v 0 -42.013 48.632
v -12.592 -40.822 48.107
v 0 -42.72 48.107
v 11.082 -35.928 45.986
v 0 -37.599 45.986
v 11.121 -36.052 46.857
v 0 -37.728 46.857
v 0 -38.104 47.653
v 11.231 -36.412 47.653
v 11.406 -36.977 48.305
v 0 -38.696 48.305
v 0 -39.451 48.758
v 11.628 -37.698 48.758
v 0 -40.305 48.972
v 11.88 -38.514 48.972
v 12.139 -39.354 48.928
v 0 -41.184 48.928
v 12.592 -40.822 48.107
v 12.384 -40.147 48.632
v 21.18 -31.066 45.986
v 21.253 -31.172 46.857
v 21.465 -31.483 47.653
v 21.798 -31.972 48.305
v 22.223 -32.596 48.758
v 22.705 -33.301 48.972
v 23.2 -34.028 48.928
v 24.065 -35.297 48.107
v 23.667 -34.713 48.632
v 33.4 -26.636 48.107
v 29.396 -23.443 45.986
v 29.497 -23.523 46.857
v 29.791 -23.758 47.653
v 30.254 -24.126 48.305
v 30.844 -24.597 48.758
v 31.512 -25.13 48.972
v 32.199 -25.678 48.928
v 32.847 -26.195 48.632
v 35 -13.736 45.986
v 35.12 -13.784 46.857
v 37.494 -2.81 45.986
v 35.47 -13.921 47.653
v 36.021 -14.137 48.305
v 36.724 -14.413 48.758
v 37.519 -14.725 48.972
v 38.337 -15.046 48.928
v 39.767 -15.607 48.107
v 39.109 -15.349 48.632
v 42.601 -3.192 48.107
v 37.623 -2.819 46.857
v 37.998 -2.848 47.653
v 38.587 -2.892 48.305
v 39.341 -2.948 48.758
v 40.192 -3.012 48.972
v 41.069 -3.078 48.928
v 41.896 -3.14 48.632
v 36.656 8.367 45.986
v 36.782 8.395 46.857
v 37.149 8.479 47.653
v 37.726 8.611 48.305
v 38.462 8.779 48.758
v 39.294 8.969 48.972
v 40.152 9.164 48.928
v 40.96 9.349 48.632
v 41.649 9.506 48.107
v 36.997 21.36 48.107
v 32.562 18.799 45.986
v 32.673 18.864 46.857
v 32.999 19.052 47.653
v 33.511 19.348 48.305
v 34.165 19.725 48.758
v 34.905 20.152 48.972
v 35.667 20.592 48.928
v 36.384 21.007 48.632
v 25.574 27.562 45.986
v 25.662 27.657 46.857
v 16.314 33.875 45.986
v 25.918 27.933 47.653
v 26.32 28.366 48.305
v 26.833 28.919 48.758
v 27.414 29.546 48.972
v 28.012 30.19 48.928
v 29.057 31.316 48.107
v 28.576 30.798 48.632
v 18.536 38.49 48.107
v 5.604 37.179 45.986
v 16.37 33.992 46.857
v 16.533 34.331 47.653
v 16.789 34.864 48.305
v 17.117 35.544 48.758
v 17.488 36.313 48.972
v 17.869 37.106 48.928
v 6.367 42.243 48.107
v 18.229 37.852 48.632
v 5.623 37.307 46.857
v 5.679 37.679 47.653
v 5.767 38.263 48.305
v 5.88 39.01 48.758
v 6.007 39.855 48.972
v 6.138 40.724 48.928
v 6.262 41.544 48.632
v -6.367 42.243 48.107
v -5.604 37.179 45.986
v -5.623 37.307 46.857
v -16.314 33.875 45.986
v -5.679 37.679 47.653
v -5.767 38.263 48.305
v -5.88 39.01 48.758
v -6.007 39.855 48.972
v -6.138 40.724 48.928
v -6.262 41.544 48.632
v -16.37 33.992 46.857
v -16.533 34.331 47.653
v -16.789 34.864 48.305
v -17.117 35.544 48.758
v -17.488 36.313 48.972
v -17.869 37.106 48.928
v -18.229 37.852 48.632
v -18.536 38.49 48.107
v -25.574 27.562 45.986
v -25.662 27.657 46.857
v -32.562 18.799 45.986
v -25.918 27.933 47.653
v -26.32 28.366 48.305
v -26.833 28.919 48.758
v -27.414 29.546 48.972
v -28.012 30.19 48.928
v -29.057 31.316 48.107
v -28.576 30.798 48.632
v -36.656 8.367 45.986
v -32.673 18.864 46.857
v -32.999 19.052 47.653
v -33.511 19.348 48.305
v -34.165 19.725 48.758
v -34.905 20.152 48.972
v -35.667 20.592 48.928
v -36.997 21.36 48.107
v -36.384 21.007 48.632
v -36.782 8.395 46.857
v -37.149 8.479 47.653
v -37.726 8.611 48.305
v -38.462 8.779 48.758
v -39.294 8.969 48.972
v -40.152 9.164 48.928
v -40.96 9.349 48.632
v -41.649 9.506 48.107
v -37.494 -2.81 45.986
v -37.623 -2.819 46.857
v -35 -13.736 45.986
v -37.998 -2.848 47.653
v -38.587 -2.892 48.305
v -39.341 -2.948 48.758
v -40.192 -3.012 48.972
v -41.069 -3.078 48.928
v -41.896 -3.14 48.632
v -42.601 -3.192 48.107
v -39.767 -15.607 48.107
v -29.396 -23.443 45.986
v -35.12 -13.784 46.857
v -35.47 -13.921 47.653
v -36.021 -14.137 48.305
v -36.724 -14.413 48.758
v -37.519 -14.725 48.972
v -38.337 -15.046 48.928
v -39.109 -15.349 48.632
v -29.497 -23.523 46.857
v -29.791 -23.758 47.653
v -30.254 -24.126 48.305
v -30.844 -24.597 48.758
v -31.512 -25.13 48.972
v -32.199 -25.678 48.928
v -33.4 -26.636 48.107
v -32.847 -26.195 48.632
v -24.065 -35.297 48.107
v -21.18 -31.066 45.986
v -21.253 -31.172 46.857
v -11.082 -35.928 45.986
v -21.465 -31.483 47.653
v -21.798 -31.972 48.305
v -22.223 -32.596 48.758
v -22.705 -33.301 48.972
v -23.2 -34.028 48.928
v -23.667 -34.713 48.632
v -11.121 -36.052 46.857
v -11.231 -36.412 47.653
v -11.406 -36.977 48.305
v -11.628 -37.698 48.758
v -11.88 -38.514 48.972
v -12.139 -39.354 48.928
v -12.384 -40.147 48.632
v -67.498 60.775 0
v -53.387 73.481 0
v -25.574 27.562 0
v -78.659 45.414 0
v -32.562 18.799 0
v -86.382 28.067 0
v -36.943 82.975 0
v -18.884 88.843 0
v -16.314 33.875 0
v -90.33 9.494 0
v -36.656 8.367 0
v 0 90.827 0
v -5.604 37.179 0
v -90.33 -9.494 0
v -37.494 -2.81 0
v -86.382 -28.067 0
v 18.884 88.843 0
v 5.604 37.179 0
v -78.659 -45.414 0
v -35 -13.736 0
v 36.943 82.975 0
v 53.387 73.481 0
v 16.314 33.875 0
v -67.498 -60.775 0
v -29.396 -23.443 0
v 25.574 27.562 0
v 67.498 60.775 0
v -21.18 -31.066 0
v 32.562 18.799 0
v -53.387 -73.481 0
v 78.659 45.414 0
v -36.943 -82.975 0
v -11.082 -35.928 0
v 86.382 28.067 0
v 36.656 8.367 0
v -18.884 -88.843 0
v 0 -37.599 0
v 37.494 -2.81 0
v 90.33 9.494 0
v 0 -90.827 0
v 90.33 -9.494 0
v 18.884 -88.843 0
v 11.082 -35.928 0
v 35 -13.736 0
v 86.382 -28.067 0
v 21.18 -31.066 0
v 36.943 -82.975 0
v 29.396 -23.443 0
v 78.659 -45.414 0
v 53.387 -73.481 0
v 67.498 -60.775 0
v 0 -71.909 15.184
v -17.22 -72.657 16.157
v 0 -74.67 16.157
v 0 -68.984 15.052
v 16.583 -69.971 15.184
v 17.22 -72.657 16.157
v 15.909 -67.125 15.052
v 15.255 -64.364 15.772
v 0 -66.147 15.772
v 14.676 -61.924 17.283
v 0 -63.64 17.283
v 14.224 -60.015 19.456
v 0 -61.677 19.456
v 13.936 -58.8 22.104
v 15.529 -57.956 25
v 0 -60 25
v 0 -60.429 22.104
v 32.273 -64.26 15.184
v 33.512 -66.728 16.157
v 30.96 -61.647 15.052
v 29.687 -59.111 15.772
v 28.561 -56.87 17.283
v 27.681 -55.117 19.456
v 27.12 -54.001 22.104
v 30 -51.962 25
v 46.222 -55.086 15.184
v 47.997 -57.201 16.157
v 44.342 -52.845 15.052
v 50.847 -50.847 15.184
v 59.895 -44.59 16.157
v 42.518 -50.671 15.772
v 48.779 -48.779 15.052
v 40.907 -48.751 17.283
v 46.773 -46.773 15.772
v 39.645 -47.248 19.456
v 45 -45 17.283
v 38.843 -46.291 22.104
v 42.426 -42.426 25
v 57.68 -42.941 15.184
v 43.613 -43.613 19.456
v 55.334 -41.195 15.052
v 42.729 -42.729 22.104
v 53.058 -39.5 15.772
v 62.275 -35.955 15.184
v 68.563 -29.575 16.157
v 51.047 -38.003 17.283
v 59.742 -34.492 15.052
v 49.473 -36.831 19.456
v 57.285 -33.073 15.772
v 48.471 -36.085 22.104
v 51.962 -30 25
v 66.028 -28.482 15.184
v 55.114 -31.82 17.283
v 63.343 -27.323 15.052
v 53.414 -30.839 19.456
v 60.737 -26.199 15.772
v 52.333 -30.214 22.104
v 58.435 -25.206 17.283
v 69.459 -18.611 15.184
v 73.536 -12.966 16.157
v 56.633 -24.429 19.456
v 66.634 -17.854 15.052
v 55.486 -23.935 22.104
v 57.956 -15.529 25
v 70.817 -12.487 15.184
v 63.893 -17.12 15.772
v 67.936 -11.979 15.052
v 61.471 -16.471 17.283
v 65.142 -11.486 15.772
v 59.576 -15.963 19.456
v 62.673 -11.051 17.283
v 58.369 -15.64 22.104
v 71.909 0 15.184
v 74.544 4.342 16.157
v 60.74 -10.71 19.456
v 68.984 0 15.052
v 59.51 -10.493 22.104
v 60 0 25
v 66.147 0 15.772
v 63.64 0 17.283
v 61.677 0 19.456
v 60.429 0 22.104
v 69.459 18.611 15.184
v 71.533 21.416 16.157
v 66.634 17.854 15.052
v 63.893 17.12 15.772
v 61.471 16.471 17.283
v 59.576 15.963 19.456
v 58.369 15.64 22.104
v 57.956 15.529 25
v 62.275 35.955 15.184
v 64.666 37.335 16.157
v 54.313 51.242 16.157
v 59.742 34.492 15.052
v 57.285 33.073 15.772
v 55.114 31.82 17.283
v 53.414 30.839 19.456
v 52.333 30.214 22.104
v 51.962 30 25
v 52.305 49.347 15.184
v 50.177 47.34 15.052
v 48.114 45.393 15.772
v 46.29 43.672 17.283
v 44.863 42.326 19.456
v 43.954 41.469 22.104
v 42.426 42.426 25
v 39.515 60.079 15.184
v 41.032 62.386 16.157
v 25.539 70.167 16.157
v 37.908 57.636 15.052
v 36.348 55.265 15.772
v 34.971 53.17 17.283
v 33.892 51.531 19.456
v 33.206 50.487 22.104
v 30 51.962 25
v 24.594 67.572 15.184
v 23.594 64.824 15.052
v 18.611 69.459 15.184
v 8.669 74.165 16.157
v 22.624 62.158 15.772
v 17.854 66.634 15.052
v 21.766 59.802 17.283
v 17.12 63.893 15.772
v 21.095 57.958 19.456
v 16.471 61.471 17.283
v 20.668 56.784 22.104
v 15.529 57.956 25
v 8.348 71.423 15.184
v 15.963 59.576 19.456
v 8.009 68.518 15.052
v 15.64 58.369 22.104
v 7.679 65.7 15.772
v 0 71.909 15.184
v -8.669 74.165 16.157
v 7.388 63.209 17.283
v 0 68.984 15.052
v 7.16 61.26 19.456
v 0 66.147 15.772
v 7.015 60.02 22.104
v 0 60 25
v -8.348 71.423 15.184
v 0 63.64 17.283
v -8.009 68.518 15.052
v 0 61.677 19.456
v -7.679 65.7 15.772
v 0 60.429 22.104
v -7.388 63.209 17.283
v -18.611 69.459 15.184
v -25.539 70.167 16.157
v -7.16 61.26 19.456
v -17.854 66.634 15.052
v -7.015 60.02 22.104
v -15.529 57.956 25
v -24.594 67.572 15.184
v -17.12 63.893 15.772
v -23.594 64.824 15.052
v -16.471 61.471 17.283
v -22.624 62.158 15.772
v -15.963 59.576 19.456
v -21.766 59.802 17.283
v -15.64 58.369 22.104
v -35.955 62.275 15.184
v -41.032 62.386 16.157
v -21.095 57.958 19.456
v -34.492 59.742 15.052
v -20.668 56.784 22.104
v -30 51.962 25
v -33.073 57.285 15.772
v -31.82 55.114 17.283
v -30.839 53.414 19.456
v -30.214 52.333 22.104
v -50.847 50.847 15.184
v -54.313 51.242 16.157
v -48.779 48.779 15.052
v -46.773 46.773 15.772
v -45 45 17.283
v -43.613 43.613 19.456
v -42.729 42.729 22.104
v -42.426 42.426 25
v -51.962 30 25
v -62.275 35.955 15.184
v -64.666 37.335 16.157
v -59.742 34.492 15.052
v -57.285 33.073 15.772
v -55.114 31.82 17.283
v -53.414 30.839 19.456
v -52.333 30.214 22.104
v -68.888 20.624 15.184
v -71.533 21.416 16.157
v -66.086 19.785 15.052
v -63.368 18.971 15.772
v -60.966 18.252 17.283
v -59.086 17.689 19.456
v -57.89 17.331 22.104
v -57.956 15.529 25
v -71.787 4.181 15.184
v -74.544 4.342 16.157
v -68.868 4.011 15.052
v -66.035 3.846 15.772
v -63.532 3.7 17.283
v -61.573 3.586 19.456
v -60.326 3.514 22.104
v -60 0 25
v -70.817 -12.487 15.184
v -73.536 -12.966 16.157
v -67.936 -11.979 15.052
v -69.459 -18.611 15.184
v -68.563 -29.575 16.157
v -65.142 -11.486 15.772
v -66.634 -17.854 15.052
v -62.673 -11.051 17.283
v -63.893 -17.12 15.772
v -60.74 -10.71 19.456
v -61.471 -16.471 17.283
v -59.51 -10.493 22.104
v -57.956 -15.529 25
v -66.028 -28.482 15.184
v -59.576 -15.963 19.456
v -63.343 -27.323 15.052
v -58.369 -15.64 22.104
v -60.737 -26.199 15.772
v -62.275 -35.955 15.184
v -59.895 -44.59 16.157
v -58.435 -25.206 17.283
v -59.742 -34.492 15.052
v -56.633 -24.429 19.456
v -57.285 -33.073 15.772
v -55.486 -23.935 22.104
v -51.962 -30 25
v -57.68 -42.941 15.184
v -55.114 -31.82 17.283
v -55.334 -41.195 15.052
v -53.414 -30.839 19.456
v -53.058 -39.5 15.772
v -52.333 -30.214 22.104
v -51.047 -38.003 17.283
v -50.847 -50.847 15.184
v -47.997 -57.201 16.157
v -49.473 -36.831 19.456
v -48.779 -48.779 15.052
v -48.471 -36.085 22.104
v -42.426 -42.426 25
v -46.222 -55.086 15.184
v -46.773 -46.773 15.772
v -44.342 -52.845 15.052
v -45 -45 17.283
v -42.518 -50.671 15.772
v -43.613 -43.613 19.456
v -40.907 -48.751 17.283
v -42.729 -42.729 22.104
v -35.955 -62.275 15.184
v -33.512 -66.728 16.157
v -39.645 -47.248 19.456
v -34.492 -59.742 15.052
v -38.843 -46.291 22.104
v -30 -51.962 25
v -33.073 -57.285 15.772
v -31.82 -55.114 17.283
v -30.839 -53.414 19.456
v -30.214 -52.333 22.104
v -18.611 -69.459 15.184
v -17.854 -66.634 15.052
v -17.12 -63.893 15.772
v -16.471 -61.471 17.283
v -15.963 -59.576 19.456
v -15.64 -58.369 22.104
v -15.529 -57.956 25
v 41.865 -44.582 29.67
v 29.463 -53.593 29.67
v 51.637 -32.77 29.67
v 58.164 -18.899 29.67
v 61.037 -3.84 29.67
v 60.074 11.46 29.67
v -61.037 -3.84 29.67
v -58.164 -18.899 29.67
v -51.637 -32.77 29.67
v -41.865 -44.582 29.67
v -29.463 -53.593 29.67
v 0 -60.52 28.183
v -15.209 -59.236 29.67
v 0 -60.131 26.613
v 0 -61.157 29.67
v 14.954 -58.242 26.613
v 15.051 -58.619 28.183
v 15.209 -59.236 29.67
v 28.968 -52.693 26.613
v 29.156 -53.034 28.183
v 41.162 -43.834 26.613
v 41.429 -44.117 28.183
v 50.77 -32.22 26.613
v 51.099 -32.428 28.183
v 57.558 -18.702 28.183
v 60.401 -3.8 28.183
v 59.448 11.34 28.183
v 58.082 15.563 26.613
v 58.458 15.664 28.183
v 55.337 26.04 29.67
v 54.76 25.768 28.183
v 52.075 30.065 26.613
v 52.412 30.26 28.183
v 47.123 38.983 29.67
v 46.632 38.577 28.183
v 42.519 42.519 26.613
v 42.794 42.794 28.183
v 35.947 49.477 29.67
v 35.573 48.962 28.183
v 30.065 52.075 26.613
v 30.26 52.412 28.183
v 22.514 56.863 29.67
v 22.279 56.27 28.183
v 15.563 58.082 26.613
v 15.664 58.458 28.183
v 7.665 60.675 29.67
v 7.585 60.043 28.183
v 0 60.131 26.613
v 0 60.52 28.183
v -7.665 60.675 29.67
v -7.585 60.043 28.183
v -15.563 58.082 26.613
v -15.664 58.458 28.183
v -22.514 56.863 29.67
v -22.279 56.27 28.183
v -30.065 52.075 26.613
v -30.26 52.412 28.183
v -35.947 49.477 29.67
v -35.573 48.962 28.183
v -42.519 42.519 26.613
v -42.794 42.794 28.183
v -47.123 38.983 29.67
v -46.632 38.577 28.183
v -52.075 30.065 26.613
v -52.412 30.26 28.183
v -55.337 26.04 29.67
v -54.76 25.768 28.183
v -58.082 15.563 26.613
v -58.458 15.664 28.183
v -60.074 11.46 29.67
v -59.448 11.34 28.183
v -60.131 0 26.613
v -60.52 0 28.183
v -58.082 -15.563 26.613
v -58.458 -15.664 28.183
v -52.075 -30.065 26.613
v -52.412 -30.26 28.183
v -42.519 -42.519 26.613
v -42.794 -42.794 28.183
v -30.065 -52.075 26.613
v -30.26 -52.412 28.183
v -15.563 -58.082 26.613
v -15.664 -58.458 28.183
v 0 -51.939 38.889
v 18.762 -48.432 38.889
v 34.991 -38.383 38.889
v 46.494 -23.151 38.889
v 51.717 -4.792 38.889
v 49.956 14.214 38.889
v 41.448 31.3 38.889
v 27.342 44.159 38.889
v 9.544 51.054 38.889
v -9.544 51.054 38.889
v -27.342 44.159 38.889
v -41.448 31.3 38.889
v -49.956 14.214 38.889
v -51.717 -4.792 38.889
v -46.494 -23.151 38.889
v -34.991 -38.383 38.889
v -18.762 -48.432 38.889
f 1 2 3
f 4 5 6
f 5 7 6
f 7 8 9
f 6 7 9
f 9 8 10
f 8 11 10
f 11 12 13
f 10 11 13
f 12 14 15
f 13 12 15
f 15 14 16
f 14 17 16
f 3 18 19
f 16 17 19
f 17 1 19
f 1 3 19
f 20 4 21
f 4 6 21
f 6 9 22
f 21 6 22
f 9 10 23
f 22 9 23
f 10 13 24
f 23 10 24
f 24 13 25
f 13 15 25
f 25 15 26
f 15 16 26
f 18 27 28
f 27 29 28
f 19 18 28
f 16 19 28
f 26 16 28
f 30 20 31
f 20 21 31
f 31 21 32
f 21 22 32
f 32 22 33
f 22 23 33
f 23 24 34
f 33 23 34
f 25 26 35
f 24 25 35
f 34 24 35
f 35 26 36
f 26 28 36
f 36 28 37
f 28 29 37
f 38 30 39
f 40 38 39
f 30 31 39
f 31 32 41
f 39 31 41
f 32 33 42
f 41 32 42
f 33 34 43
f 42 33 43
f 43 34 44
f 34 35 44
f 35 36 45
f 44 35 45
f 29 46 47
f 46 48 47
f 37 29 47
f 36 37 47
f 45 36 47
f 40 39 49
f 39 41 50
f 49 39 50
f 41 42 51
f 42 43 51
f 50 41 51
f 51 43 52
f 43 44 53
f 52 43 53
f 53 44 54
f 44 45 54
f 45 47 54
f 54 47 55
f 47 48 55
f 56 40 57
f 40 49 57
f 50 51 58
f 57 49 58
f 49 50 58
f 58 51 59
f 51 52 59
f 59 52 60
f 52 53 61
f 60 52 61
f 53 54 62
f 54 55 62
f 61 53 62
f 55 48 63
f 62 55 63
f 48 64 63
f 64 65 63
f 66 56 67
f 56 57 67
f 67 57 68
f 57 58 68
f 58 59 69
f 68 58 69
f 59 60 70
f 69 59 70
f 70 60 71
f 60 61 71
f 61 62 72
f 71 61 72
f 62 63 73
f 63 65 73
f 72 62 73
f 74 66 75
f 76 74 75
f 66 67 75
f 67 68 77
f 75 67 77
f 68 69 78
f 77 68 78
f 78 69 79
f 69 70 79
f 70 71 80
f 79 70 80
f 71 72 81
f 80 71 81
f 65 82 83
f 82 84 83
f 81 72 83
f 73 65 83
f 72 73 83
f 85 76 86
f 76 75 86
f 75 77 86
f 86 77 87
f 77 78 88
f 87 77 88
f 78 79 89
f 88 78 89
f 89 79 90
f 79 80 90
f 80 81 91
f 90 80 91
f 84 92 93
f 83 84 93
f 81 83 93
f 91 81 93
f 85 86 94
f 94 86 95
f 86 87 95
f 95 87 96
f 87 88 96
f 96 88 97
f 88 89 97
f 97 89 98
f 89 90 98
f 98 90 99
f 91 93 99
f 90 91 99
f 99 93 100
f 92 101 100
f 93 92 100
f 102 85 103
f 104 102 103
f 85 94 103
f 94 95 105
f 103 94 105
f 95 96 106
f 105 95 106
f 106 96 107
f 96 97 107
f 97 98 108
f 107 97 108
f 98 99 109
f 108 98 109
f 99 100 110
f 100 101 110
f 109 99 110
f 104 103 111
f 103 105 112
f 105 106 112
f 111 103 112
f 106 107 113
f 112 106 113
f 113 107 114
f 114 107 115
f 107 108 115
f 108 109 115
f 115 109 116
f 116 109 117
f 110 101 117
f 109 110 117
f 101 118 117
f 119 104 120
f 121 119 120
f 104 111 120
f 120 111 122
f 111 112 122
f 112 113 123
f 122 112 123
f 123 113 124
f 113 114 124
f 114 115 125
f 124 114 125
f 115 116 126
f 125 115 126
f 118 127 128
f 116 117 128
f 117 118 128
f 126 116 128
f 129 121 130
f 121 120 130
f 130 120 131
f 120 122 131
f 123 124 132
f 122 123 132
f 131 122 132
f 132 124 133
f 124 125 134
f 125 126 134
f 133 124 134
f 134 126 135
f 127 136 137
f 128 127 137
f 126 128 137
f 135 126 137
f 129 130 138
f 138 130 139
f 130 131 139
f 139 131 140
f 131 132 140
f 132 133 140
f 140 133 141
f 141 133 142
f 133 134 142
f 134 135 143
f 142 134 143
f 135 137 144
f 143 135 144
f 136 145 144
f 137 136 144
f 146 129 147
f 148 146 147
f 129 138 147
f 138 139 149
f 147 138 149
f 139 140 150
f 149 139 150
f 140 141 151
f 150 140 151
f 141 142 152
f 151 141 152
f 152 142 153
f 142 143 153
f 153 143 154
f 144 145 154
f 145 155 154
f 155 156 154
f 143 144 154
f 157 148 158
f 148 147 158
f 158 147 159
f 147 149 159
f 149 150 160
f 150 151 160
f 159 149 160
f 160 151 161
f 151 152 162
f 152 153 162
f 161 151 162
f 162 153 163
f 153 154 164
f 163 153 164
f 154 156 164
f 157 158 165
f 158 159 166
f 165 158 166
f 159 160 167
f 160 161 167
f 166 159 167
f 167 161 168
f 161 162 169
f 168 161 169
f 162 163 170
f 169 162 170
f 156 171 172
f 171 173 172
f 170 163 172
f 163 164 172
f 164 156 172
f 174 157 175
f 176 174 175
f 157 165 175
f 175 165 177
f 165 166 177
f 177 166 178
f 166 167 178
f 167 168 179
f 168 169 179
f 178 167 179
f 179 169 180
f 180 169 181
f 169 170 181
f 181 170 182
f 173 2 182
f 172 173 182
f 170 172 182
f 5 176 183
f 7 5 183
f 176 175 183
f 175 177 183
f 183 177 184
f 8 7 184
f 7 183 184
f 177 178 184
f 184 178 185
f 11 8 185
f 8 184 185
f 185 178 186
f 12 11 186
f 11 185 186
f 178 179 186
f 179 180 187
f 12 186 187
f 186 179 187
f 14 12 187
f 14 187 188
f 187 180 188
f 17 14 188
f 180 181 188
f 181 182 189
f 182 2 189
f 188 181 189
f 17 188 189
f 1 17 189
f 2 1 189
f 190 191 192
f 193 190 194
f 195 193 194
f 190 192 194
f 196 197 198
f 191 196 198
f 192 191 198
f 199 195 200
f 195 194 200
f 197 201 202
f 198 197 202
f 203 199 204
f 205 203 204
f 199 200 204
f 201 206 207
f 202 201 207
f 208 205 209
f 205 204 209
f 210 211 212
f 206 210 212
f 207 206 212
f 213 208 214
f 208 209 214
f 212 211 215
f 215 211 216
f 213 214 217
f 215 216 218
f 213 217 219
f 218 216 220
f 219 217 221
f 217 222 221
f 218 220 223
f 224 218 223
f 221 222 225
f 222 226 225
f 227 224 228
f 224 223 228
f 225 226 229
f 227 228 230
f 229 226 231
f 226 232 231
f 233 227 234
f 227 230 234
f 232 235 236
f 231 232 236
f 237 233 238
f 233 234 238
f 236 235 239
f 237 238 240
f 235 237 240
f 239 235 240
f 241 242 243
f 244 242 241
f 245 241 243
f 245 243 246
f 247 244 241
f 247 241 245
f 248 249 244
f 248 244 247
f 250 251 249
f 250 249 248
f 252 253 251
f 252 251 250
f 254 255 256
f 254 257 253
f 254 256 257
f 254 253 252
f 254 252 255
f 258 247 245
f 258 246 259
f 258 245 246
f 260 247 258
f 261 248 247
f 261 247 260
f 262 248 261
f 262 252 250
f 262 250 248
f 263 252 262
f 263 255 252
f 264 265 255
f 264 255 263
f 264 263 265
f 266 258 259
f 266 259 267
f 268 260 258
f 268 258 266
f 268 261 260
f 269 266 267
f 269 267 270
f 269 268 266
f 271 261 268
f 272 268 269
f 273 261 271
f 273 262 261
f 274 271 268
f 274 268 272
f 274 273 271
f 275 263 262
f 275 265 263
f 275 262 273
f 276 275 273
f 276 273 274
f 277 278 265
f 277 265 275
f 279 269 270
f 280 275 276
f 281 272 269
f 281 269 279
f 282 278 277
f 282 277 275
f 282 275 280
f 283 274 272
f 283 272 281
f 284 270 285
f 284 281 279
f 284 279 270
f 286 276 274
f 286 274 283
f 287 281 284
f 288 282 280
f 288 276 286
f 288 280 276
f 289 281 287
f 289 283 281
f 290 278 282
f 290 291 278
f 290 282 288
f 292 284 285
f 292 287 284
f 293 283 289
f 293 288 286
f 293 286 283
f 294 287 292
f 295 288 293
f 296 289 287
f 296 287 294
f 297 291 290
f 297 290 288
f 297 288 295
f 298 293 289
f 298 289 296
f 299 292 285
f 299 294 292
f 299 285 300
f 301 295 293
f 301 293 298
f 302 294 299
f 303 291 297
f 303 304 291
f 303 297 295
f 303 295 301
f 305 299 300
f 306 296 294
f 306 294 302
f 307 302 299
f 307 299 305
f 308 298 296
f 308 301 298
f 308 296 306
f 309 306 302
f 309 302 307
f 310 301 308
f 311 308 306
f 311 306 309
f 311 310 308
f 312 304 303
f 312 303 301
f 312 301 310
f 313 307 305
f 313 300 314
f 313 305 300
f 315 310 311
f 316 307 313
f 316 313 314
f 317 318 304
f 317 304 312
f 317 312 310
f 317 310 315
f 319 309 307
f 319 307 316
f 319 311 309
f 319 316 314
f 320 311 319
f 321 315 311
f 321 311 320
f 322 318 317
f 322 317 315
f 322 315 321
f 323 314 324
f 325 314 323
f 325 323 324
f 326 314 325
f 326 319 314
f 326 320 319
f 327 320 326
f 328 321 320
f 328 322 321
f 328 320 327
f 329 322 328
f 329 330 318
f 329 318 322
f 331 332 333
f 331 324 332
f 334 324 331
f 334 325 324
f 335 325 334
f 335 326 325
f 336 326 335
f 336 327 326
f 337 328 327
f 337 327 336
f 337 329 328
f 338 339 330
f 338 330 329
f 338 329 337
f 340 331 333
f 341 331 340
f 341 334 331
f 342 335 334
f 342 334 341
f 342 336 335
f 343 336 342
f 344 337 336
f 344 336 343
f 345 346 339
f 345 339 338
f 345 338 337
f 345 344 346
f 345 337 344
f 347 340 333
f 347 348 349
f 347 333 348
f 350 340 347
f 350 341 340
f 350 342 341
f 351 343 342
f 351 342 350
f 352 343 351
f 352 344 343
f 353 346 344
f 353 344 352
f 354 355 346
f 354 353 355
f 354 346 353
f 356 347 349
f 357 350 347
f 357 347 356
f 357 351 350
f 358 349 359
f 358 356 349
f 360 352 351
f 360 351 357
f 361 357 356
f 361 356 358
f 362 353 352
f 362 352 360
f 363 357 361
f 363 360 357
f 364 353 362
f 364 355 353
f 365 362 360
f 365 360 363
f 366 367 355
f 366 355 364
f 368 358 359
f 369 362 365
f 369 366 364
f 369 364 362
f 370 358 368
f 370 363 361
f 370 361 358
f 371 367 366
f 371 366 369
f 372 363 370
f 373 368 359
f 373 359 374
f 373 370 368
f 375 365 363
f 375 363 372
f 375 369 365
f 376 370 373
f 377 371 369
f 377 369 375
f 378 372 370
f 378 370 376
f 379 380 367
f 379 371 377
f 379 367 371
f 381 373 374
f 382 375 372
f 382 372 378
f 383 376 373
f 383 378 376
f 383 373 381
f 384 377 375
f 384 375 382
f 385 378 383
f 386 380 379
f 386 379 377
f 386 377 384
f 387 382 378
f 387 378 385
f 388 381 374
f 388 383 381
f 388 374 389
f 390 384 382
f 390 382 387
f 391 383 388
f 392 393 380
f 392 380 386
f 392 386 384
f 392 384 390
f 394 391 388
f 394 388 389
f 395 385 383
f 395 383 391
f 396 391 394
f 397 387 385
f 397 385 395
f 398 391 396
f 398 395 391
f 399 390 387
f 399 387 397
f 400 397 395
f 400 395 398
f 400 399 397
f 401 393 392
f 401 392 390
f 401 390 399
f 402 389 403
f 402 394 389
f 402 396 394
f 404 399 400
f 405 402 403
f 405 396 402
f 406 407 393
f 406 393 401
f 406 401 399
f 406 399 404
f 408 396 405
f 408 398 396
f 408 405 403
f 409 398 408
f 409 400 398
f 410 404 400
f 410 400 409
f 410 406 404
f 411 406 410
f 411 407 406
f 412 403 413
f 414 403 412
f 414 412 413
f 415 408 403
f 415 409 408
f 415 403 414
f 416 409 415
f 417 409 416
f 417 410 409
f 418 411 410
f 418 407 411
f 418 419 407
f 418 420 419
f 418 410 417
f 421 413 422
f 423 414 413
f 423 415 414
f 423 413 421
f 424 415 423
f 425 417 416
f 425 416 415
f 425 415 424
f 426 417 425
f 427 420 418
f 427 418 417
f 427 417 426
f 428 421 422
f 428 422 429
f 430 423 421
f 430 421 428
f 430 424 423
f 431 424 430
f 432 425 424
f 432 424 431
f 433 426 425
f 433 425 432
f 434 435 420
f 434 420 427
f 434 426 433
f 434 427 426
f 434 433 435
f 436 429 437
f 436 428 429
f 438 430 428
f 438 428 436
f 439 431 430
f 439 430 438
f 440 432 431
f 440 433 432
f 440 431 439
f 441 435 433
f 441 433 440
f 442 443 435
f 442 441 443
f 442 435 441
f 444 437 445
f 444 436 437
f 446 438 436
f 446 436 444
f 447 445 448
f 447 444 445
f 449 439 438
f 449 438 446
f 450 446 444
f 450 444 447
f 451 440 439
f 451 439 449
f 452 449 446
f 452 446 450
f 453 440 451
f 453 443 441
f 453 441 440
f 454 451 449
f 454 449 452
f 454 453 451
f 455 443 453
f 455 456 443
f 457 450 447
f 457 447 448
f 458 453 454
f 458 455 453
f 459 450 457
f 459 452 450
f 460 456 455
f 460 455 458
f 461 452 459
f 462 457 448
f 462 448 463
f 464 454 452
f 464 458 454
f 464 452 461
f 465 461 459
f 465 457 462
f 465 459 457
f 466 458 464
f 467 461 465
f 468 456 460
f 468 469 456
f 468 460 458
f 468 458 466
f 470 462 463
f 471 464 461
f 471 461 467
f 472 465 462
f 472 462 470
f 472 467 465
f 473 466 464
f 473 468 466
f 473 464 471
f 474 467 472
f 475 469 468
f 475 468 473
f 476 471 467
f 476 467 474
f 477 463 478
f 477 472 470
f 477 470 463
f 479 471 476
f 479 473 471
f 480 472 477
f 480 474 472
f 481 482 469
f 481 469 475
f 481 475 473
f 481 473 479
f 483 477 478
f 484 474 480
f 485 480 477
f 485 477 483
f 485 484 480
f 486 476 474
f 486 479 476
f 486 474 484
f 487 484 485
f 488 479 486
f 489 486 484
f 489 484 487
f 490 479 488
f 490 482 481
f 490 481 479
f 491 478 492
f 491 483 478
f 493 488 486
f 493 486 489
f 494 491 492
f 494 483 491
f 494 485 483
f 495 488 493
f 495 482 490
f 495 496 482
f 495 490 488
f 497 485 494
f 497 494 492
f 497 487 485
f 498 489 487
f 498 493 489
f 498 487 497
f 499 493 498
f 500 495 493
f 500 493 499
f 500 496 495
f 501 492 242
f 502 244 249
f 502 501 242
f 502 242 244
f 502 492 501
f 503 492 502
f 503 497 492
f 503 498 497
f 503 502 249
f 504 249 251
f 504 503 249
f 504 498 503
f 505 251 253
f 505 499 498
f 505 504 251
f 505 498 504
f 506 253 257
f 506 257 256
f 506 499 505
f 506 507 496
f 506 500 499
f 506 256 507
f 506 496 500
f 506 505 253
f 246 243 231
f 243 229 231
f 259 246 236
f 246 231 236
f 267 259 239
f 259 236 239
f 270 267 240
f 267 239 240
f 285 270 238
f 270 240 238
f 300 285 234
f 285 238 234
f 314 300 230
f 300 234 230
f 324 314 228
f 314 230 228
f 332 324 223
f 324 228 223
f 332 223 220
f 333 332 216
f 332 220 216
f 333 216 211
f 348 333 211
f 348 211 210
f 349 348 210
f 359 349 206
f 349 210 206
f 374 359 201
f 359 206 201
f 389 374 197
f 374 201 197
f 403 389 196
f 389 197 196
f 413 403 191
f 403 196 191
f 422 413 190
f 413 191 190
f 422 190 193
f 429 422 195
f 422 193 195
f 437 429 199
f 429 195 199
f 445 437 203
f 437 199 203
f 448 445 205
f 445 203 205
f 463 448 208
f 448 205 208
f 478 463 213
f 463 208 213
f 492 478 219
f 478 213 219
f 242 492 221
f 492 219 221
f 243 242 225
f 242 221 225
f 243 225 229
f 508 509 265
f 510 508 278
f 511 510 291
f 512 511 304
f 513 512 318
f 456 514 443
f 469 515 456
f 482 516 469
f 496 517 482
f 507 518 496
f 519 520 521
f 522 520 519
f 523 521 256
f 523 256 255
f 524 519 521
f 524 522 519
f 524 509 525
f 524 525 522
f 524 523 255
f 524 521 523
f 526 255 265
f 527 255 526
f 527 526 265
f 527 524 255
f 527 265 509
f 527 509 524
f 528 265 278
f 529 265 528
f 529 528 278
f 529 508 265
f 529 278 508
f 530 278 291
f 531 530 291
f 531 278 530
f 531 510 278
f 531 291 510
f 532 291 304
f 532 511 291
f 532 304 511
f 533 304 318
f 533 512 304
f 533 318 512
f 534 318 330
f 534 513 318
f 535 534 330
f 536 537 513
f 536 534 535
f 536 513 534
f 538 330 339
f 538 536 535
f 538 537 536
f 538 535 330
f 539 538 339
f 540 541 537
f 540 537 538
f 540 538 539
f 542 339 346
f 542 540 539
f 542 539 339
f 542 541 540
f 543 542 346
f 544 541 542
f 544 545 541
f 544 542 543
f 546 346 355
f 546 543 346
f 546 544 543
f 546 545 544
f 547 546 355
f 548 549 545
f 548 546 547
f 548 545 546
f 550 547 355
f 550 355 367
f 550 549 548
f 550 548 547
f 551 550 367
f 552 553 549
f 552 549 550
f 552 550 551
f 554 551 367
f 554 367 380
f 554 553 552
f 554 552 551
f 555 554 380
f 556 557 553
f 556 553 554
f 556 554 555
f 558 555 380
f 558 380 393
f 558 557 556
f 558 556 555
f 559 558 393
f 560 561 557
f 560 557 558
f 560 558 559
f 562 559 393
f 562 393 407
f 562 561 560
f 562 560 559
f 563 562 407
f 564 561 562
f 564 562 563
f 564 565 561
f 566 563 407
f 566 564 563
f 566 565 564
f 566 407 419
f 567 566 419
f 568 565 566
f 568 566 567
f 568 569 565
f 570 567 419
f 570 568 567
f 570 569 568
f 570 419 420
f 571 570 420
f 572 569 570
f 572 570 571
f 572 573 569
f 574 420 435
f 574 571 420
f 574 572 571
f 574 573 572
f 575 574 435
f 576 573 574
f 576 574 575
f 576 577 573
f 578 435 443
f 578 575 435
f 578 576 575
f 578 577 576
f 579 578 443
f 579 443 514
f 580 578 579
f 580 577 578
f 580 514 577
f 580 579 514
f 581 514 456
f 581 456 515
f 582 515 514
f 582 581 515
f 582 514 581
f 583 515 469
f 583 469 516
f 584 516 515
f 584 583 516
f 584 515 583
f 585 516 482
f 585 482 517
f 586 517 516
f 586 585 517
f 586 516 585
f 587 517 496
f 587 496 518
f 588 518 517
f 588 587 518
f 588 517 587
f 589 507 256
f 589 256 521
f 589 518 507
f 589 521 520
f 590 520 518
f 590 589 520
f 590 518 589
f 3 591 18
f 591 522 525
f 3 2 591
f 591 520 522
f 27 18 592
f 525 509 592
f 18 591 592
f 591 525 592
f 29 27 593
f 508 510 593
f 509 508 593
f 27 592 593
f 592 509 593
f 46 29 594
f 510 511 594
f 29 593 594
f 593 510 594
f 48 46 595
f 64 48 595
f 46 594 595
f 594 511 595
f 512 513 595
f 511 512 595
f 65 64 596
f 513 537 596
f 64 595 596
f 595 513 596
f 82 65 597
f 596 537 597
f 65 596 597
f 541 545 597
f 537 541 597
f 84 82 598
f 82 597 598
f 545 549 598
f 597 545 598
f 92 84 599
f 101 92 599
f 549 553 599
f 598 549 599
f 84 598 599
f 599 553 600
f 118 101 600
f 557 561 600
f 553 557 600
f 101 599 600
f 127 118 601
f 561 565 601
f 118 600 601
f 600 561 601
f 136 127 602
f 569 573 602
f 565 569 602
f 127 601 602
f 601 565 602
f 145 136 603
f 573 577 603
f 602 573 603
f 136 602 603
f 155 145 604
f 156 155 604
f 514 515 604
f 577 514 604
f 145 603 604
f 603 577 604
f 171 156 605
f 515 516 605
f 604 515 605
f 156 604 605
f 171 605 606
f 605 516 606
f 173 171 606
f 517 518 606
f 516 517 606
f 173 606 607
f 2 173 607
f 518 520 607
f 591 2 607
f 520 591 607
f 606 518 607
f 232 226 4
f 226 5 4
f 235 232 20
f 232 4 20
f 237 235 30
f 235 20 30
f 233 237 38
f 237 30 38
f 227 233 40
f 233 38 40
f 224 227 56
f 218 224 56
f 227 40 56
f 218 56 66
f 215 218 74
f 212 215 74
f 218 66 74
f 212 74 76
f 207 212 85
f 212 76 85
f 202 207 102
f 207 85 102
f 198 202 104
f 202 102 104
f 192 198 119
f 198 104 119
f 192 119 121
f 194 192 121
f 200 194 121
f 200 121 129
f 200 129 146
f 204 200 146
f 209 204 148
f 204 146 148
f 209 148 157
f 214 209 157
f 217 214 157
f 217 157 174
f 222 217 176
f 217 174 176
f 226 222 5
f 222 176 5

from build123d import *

# Parameters (mm, degrees)
F2_R = 10


with BuildPart() as f1:
    # F0 (on Right) → F1 (revolve)
    with BuildSketch(Plane.YZ):
        with BuildLine():
            Line((-90.827465, 0), (-37.59887, 0))
            Line((-37.59887, 0), (-37.59887, 45.985954))
            ThreePointArc((-37.59887, 45.985954), (-39.45082, 48.757593), (-42.72019, 48.107275))
            Line((-42.72019, 48.107275), (-90.827465, 0))
        make_face()
    revolve(axis=Axis((0, 0, 38.720641), (0, 0, 1)))

    # F2 (on Right) → F3 (revolve, cut)
    with BuildSketch(Plane.YZ):
        with Locations((-70, 25)):
            Circle(F2_R)
    revolve(axis=Axis((0, 0, 29.182823), (0, 0, 1)), mode=Mode.SUBTRACT)


solid = f1.part
